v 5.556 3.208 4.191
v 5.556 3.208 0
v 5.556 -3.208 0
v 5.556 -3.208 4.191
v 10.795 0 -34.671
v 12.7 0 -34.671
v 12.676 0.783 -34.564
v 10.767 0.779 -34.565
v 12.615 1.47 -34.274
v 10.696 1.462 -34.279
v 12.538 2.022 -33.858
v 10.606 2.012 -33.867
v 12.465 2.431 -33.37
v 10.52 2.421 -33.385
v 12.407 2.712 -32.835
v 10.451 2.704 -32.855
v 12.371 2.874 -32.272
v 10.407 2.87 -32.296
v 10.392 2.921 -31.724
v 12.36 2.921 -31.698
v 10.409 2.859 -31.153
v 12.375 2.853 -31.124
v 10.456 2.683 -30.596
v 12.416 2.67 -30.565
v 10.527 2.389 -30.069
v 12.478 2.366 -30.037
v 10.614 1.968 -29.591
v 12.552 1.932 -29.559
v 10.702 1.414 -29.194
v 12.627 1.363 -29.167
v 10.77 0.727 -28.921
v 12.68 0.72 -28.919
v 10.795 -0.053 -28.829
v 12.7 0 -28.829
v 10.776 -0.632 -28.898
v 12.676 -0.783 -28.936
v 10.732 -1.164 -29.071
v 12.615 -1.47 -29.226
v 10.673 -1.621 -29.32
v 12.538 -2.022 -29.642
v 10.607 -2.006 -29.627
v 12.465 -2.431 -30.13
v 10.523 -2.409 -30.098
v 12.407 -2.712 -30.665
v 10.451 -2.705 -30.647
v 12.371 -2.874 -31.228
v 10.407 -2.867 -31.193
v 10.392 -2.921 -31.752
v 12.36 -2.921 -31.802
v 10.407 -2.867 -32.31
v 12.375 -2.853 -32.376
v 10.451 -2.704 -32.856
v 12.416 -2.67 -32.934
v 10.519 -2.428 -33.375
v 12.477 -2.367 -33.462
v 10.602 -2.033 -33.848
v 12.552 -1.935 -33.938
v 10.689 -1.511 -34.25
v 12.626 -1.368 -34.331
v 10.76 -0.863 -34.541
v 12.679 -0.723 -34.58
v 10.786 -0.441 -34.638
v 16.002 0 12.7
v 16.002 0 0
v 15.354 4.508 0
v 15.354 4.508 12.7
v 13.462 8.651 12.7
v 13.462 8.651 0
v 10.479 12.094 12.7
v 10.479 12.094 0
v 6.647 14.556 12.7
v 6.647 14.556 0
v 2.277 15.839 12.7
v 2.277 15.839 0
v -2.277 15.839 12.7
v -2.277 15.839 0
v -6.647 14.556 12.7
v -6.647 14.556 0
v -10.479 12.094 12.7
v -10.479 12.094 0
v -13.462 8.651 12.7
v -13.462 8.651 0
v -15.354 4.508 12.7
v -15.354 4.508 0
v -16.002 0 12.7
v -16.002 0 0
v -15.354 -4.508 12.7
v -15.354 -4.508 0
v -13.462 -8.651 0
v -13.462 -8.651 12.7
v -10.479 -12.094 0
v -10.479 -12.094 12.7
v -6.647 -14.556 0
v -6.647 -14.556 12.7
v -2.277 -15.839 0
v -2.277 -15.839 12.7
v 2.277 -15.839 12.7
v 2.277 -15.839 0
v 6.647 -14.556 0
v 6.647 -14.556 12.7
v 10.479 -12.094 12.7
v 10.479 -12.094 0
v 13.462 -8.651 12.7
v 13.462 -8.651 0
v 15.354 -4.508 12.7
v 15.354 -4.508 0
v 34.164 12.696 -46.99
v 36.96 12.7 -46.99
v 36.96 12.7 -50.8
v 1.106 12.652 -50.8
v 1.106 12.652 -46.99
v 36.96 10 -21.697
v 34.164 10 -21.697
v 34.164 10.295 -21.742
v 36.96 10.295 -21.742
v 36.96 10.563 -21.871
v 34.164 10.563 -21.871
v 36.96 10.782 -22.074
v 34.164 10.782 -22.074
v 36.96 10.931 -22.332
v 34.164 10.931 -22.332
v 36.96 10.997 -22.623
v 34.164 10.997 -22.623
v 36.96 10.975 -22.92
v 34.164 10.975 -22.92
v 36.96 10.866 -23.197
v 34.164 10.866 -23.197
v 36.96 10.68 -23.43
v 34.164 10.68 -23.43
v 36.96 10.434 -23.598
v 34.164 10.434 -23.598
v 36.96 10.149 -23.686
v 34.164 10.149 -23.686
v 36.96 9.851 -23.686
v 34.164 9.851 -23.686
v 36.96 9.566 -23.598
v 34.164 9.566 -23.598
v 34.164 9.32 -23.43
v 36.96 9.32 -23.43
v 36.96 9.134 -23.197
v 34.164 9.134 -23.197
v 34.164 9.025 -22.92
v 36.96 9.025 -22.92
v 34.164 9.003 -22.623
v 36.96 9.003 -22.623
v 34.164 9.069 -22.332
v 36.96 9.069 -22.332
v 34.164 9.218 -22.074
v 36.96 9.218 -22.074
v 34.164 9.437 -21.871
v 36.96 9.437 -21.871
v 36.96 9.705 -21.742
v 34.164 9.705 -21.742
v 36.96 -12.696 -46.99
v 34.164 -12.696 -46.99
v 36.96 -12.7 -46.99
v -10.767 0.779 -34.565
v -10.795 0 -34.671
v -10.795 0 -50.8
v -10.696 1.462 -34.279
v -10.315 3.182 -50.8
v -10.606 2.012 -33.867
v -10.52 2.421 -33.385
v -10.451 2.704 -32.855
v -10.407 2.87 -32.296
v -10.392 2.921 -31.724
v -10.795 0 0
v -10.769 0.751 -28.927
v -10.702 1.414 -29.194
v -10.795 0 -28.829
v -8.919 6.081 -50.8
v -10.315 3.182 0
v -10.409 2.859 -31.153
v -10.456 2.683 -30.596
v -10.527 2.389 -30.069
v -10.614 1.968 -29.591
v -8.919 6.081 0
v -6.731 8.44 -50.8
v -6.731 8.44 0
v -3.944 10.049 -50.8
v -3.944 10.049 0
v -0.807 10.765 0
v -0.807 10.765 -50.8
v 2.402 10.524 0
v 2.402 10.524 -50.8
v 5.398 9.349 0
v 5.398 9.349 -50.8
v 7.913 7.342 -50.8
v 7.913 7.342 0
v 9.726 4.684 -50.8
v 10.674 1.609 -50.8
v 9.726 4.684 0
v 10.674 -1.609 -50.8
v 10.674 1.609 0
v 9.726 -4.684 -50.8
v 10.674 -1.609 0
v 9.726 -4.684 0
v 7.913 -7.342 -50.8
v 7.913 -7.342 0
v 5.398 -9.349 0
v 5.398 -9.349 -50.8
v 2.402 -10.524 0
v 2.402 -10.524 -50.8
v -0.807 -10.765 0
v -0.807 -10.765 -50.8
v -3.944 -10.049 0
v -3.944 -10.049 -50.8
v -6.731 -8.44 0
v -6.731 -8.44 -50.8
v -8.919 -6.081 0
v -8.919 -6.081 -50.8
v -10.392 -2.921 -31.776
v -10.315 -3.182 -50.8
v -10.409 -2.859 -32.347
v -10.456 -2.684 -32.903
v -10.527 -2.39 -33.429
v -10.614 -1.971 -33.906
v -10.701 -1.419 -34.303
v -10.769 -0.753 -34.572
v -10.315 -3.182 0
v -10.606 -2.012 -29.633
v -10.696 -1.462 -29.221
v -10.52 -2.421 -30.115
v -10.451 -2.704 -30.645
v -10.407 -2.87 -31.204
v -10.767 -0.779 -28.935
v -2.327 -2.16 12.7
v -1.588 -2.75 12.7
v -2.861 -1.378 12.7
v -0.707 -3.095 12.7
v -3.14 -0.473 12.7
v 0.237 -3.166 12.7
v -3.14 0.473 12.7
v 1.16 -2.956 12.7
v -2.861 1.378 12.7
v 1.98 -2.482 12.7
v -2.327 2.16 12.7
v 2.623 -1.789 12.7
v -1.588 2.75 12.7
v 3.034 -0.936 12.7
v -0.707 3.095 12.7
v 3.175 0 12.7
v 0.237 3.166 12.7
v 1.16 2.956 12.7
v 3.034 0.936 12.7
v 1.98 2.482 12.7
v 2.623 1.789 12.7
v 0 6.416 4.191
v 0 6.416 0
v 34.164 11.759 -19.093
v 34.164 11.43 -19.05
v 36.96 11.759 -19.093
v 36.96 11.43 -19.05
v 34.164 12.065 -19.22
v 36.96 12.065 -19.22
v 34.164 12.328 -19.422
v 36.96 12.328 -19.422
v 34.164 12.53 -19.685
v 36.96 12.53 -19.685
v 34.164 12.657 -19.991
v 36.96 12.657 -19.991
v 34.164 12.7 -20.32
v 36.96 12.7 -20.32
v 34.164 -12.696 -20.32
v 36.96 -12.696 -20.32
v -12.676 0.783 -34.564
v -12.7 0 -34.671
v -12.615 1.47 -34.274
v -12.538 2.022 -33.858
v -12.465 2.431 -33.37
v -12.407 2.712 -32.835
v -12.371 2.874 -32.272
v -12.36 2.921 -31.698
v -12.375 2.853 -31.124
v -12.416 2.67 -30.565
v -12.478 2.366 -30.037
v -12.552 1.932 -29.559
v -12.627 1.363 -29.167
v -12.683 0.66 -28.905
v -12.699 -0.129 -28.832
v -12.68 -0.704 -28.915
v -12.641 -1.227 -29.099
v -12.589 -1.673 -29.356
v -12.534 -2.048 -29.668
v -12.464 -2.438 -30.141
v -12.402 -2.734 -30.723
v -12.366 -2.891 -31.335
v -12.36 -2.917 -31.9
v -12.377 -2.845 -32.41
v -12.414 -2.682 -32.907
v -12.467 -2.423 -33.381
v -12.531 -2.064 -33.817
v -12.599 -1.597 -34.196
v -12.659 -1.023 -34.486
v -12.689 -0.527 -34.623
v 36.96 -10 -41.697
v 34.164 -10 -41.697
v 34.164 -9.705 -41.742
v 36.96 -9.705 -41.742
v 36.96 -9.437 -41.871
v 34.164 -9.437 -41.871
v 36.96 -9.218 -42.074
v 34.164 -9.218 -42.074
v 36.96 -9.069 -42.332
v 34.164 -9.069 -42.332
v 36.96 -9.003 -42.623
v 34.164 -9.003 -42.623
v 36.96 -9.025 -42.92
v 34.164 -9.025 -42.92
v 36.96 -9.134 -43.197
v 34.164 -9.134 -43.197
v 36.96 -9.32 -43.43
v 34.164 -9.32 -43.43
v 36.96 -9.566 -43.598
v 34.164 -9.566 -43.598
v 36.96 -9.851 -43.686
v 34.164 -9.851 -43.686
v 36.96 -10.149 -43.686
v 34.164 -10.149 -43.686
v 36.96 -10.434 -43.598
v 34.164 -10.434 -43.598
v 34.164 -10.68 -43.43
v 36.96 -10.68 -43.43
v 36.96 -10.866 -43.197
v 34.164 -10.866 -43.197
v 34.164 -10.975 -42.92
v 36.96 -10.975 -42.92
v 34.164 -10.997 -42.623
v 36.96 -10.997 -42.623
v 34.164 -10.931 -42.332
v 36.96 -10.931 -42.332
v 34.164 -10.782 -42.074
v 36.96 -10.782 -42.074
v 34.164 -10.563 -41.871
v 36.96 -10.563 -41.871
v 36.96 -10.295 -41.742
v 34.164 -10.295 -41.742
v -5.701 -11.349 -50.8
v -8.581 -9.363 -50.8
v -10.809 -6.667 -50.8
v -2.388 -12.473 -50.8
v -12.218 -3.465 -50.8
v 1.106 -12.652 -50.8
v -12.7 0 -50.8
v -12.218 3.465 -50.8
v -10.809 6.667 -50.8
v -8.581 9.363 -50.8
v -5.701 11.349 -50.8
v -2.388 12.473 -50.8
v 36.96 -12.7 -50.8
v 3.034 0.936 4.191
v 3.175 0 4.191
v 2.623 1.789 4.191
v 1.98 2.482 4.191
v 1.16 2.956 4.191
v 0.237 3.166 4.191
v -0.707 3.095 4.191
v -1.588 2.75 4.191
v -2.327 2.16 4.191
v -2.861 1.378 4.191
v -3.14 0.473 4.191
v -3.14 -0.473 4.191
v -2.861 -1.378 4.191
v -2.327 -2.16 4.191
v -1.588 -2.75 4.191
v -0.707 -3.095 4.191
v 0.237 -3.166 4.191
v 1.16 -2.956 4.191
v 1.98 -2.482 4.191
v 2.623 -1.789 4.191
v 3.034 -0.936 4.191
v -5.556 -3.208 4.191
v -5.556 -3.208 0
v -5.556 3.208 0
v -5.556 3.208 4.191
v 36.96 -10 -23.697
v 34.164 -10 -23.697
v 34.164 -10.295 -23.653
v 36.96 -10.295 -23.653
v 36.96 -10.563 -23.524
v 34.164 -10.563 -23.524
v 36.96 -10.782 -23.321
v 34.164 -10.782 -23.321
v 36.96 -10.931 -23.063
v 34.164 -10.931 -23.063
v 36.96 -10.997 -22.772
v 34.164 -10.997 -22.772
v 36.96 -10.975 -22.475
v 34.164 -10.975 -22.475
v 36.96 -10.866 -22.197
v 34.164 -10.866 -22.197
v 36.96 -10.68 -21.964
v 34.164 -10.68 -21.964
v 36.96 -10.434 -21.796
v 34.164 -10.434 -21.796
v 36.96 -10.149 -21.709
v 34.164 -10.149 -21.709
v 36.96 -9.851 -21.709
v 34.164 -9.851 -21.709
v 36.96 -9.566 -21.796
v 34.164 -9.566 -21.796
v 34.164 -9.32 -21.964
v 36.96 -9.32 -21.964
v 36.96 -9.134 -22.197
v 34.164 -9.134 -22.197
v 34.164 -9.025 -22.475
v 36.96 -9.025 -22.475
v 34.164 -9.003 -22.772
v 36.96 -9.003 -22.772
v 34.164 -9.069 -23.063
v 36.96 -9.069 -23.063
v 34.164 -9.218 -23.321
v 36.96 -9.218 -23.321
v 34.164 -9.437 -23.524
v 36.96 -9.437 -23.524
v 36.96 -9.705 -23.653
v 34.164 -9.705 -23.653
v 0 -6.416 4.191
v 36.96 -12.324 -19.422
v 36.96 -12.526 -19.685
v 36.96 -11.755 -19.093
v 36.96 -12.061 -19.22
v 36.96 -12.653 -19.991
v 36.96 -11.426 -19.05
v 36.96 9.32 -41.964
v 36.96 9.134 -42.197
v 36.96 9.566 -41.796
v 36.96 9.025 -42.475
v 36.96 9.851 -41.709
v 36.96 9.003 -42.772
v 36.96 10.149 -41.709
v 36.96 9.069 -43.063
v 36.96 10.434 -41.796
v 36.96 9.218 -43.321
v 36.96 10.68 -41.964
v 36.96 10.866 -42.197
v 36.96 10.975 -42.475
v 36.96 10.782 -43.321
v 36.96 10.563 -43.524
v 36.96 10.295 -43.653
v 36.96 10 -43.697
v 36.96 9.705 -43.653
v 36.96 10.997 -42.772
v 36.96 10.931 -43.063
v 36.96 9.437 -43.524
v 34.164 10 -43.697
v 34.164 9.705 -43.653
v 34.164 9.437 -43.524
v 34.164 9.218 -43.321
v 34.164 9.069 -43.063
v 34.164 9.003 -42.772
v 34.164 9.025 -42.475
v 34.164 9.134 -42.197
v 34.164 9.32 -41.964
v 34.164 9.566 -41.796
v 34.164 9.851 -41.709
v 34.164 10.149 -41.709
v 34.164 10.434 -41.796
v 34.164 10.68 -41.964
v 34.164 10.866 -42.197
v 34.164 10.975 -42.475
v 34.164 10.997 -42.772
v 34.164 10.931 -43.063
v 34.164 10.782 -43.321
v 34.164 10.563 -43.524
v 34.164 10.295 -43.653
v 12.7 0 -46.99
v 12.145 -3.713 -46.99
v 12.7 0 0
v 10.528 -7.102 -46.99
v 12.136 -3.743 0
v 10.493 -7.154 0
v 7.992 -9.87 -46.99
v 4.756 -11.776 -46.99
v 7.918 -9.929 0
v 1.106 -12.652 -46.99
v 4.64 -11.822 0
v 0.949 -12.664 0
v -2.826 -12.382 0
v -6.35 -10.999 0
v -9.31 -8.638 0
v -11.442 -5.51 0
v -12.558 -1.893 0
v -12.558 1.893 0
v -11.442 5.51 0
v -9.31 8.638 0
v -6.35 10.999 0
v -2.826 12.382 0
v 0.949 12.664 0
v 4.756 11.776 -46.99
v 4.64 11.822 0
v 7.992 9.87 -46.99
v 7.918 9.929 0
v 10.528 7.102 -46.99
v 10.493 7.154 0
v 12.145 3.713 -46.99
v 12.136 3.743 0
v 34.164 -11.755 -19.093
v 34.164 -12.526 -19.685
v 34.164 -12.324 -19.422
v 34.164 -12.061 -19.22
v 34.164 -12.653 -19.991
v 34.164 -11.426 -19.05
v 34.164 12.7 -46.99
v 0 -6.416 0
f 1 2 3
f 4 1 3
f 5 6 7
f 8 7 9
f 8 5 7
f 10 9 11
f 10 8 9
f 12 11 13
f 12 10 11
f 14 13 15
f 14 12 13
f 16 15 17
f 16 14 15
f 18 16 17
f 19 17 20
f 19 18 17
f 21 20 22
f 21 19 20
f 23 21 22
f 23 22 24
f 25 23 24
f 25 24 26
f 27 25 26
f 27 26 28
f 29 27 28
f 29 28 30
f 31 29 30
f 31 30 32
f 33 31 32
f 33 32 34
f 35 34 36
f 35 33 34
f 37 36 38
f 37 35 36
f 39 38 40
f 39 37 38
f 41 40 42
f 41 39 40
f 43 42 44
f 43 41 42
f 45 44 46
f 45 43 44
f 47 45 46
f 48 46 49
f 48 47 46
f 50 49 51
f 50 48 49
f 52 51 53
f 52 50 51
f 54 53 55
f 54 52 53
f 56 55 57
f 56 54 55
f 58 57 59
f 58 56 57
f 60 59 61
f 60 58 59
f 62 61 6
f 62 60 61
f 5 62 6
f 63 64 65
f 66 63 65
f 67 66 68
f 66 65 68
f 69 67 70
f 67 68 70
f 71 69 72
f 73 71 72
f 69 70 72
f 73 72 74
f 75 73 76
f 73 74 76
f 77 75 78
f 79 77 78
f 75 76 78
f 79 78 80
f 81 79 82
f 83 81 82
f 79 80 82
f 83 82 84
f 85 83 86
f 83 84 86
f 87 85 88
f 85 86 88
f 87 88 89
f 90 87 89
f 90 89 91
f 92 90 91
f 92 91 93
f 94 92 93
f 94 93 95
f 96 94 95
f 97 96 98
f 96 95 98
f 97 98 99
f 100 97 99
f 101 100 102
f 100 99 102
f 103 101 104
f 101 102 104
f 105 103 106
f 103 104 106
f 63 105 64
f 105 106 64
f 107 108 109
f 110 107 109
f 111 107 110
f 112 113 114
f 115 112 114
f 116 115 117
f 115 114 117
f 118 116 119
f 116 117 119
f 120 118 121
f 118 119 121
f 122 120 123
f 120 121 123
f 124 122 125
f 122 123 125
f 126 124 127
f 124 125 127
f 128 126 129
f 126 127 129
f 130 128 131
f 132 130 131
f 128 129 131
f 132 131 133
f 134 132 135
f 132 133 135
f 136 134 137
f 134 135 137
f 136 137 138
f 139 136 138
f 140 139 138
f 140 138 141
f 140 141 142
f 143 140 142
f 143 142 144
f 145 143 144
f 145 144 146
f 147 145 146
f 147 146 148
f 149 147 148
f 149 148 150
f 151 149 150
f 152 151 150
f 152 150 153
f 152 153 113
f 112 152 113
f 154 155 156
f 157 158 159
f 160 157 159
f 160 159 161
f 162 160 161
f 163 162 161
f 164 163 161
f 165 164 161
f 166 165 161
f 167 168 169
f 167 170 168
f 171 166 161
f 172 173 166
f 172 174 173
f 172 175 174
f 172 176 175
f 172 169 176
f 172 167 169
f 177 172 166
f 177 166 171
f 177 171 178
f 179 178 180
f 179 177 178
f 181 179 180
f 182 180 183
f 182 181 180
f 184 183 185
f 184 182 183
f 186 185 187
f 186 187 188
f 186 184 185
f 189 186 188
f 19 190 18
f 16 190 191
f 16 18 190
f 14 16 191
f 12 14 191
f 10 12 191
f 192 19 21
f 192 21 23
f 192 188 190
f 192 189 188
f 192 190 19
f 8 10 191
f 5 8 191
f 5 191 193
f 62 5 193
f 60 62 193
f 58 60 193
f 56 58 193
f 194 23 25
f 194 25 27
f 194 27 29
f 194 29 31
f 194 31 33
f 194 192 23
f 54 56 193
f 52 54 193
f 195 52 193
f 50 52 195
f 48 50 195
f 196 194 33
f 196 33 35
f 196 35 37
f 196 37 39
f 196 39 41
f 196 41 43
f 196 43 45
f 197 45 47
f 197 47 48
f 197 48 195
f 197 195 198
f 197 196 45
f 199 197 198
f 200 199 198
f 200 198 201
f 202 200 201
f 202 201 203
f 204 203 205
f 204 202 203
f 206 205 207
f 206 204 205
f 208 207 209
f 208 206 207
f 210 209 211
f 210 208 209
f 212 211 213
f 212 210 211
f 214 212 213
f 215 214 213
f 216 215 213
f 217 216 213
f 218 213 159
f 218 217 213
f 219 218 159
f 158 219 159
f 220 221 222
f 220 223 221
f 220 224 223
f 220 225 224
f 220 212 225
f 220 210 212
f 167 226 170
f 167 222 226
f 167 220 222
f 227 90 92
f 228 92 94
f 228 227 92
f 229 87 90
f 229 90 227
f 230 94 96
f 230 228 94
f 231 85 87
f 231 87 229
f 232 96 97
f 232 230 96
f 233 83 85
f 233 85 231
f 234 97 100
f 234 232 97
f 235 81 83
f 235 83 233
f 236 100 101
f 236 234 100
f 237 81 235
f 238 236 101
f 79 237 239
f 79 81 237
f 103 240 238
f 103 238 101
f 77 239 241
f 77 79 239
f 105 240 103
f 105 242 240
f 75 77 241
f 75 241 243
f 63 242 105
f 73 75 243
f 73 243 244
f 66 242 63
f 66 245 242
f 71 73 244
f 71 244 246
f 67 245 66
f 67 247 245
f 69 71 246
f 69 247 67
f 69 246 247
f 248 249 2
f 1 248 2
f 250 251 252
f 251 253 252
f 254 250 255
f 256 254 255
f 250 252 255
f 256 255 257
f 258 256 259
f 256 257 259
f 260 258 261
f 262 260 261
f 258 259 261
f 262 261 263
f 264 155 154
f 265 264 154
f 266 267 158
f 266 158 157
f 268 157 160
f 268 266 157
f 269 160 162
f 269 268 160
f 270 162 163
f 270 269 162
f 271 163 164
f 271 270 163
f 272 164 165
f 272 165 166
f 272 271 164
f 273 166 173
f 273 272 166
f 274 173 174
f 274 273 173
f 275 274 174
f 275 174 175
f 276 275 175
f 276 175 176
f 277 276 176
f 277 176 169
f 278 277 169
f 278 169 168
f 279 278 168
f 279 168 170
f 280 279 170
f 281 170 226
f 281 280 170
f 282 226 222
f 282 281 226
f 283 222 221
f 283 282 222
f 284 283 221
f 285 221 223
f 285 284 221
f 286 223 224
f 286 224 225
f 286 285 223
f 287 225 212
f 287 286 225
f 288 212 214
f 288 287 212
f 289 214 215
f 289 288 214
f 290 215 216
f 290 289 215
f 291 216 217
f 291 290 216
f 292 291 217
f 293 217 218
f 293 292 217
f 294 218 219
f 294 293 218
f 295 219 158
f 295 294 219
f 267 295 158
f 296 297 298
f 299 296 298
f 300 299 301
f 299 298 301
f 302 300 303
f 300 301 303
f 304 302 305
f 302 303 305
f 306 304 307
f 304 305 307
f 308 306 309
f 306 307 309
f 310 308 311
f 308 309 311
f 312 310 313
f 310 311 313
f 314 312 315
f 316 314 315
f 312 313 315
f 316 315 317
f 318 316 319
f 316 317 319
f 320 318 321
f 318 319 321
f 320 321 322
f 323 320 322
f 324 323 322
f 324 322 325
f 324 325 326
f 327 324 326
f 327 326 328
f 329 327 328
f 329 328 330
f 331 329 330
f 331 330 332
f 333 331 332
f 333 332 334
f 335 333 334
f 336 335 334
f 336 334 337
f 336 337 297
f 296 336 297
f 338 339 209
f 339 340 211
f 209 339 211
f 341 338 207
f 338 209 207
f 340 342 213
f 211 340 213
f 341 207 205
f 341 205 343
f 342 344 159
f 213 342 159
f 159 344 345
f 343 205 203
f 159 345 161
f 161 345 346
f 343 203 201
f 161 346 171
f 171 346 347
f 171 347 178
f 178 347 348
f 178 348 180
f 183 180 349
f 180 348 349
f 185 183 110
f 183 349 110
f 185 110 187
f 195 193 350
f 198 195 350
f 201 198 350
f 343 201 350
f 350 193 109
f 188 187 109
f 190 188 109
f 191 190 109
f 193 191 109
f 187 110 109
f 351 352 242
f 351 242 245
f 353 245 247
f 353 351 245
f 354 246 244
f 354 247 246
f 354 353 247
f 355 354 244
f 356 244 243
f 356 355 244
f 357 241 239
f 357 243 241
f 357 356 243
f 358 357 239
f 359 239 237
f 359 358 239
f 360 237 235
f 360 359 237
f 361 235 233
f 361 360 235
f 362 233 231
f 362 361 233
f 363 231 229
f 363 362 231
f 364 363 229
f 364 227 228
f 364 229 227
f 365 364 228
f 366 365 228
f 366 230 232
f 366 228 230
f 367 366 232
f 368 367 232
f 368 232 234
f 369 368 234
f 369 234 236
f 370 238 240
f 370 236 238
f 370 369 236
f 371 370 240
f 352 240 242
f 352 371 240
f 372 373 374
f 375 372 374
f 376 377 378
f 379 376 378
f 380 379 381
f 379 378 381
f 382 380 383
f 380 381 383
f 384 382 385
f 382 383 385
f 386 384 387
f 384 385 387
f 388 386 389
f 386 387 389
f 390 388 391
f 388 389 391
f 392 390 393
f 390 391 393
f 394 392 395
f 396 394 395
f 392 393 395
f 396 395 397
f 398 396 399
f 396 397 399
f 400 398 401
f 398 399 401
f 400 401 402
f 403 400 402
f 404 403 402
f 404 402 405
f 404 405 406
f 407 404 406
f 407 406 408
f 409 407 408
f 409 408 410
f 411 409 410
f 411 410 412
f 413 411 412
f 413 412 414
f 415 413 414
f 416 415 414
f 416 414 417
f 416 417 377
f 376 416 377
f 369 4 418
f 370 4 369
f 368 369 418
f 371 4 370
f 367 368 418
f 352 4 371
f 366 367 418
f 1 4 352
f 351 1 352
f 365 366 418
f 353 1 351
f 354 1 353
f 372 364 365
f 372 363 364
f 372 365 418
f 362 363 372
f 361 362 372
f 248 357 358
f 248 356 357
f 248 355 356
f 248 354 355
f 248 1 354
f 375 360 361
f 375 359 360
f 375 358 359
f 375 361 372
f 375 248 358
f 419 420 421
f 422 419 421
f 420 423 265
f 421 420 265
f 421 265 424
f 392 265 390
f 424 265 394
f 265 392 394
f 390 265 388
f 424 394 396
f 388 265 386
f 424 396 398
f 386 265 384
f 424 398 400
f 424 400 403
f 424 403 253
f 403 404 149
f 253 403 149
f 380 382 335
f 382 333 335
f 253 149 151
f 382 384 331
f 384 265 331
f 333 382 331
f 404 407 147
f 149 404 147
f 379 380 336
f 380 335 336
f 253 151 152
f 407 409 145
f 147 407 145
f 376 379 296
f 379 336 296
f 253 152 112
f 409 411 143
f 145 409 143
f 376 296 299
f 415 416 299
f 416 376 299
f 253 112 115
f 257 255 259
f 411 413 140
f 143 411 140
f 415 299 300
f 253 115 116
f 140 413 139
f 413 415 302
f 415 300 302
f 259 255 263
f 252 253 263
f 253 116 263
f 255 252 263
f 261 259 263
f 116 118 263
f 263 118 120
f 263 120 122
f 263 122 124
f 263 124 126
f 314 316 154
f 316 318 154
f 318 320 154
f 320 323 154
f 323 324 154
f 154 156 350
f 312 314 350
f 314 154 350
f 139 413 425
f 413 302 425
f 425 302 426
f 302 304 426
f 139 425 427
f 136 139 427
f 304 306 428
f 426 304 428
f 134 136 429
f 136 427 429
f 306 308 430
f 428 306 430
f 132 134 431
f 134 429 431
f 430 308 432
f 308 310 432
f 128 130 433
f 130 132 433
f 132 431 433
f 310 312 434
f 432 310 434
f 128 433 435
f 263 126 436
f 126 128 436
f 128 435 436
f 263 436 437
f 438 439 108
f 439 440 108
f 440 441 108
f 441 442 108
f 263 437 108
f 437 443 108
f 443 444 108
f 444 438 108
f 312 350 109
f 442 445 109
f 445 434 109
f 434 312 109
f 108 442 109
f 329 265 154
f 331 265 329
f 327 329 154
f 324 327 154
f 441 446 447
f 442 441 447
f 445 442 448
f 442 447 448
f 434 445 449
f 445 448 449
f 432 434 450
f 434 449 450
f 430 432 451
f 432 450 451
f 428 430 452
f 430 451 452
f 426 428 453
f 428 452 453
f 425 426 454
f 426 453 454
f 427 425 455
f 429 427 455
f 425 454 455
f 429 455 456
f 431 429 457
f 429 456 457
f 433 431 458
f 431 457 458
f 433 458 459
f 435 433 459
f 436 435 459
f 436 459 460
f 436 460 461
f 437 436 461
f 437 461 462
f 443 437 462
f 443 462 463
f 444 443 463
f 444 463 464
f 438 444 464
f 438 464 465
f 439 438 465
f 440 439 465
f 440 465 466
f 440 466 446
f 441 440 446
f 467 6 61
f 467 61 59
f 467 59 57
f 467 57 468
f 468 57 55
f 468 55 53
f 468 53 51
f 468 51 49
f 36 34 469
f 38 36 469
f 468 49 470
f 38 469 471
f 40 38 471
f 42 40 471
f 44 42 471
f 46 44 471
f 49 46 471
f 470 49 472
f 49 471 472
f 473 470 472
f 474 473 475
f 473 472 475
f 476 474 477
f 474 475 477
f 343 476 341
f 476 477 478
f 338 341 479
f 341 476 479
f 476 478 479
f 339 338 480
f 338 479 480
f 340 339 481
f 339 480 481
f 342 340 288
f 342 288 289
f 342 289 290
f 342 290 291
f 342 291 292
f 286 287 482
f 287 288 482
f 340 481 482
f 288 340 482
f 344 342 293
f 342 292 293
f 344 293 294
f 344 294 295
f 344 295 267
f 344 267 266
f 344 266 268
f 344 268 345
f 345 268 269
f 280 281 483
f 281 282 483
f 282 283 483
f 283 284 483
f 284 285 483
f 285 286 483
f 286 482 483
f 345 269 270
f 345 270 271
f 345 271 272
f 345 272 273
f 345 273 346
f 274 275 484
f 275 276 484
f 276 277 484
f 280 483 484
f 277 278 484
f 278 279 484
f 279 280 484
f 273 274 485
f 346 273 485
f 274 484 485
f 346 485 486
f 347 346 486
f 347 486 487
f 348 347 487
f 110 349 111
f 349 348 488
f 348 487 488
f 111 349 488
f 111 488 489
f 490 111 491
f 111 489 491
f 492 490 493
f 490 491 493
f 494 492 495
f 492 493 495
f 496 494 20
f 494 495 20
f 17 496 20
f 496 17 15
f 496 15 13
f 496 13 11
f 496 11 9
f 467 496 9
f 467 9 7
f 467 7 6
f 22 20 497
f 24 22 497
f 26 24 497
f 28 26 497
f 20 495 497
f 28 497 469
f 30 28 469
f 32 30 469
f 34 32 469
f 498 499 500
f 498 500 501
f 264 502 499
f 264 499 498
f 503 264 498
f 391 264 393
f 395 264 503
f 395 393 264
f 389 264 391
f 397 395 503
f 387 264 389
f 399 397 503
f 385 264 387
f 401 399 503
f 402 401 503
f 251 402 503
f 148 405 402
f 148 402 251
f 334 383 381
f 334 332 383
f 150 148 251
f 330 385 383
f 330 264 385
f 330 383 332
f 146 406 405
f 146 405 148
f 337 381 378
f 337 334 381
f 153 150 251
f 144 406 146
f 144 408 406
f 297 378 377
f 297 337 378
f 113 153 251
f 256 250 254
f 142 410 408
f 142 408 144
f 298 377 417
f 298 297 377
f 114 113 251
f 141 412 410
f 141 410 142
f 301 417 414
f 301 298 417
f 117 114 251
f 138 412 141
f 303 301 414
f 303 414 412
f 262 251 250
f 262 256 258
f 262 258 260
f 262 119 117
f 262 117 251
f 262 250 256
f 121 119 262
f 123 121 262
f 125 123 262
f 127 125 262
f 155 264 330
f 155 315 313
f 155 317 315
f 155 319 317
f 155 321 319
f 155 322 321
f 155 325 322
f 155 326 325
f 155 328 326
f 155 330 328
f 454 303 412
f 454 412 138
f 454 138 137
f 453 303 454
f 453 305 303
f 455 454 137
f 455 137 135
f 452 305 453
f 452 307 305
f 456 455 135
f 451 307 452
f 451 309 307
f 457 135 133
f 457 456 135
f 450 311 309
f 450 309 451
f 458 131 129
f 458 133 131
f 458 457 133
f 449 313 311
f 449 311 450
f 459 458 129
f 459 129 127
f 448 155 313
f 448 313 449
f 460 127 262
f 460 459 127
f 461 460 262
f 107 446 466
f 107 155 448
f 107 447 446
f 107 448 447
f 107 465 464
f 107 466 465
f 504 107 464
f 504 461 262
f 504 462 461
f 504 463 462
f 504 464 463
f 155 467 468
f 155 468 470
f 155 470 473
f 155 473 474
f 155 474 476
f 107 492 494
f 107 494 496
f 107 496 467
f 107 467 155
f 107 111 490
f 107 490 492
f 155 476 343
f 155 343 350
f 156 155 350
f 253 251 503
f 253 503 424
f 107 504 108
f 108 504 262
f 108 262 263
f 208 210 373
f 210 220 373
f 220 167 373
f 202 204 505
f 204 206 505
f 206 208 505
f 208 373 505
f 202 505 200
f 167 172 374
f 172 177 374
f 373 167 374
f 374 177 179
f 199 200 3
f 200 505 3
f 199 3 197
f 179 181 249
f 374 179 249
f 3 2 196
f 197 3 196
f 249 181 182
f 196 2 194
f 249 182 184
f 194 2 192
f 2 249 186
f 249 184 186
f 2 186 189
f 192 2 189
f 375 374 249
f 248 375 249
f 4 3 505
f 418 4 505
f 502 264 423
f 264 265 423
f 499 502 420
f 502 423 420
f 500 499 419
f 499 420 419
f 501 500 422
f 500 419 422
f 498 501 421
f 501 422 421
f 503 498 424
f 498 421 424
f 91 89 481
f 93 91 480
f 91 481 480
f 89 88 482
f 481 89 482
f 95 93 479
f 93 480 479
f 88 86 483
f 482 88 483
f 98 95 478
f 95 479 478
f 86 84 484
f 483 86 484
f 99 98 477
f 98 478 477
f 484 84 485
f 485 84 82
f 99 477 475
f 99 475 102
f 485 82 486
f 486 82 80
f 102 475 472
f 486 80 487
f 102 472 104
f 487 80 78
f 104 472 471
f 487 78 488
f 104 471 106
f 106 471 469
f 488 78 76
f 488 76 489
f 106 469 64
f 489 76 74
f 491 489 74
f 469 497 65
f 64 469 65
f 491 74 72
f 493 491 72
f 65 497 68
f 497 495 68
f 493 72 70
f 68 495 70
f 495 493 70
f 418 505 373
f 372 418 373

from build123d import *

# Parameters (mm, degrees)
SKETCH3_R               = 16.002
BOSS_EXTRUDE1_DEPTH     = 12.7
SKETCH4_R               = 12.7
SKETCH4_R_2             = 10.795
BOSS_EXTRUDE2_DEPTH     = 50.8
CUT_EXTRUDE1_DEPTH      = 56.612660501
CUT_EXTRUDE1_DEPTH_BACK = 56.612660501
SKETCH9_R               = 2.921
CUT_EXTRUDE2_DEPTH      = 68.412002052
CUT_EXTRUDE2_DEPTH_BACK = 68.412002052
SKETCH10_R              = 3.175
CUT_EXTRUDE3_DEPTH      = 4.191
BOSS_EXTRUDE3_DEPTH     = 3.81
SKETCH13_W              = 2.796188768
SKETCH13_H              = 25.396240454
BOSS_EXTRUDE4_DEPTH     = 27.94
SKETCH14_R              = 1
CUT_EXTRUDE4_DEPTH      = 74.166658198
FILLET1_R               = 1.27


with BuildPart() as part:
    # Sketch3 → Boss-Extrude1 (new body)
    with BuildSketch(Plane.XY):
        Circle(SKETCH3_R)
    extrude(amount=BOSS_EXTRUDE1_DEPTH)

    # Sketch4 → Boss-Extrude2 (add)
    with BuildSketch(Plane(origin=(0, 0, 0), x_dir=(-1, 0, 0), z_dir=(0, 0, -1))):
        with Locations(Location((0, 0, 0), (0, 0, 180))):
            Circle(SKETCH4_R)
        Circle(SKETCH4_R_2, mode=Mode.SUBTRACT)
    extrude(amount=BOSS_EXTRUDE2_DEPTH)

    # Sketch9 → Cut-Extrude1 (cut, two sides: drawn at the far end of the back side and taken through both)
    with BuildSketch(Plane(origin=(0, 0, 0), x_dir=(0, 0, -1), z_dir=(1, 0, 0)).offset(-CUT_EXTRUDE1_DEPTH_BACK)):
        with Locations((31.75, 0)):
            Circle(SKETCH9_R)
    extrude(amount=CUT_EXTRUDE1_DEPTH + CUT_EXTRUDE1_DEPTH_BACK, mode=Mode.SUBTRACT)

    # Sketch10 → Cut-Extrude2 (cut, two sides: drawn at the far end of the back side and taken through both)
    with BuildSketch(Plane.XY.offset(12.7).offset(-CUT_EXTRUDE2_DEPTH_BACK)):
        Circle(SKETCH10_R)
    extrude(amount=CUT_EXTRUDE2_DEPTH + CUT_EXTRUDE2_DEPTH_BACK, mode=Mode.SUBTRACT)

    # Sketch5 → Cut-Extrude3 (cut)
    with BuildSketch(Plane(origin=(0, 0, 0), x_dir=(-1, 0, 0), z_dir=(0, 0, -1))):
        Polygon((0, 6.415804866), (-5.55625, 3.207902433), (-5.55625, -3.207902433), (0, -6.415804866), (5.55625, -3.207902433), (5.55625, 3.207902433), align=None)
    extrude(amount=-CUT_EXTRUDE3_DEPTH, mode=Mode.SUBTRACT)

    # Sketch12 → Boss-Extrude3 (add)
    with BuildSketch(Plane.XY.offset(-46.99)):
        with BuildLine():
            Line((36.960470848, -12.7), (36.960470848, 12.7))
            Line((36.960470848, 12.7), (1.105511904, 12.651792104))
            ThreePointArc((1.105511904, 12.651792104), (9.362958965, 8.580501117), (12.7, 0))
            ThreePointArc((12.7, 0), (9.362958965, -8.580501117), (1.105511904, -12.651792104))
            Line((1.105511904, -12.651792104), (36.960470848, -12.7))
        make_face()
    extrude(amount=-BOSS_EXTRUDE3_DEPTH)

    # Sketch13 → Boss-Extrude4 (add)
    with BuildSketch(Plane.XY.offset(-46.99)):
        with Locations((35.562376464, 0.001879773)):
            Rectangle(SKETCH13_W, SKETCH13_H)
    extrude(amount=BOSS_EXTRUDE4_DEPTH)

    # Sketch14 → Cut-Extrude4 (cut, through all)
    with BuildSketch(Plane.ZY.offset(-34.16428208)):
        with Locations((-22.697395511, 10)):
            Circle(SKETCH14_R)
        with Locations(Location((-42.697395511, 10, 0), (0, 0, 180))):
            Circle(SKETCH14_R)
        with Locations((-42.697395511, -10)):
            Circle(SKETCH14_R)
        with Locations(Location((-22.697395511, -10, 0), (0, 0, 180))):
            Circle(SKETCH14_R)
    extrude(amount=-CUT_EXTRUDE4_DEPTH, mode=Mode.SUBTRACT)

    # Fillet1
    fillet1_edges = [part.edges().sort_by_distance(p)[0] for p in [
        (35.562376464, 12.7, -19.05),
        (35.562376464, -12.696240454, -19.05),
    ]]
    fillet(fillet1_edges, radius=FILLET1_R)


solid = part.part
